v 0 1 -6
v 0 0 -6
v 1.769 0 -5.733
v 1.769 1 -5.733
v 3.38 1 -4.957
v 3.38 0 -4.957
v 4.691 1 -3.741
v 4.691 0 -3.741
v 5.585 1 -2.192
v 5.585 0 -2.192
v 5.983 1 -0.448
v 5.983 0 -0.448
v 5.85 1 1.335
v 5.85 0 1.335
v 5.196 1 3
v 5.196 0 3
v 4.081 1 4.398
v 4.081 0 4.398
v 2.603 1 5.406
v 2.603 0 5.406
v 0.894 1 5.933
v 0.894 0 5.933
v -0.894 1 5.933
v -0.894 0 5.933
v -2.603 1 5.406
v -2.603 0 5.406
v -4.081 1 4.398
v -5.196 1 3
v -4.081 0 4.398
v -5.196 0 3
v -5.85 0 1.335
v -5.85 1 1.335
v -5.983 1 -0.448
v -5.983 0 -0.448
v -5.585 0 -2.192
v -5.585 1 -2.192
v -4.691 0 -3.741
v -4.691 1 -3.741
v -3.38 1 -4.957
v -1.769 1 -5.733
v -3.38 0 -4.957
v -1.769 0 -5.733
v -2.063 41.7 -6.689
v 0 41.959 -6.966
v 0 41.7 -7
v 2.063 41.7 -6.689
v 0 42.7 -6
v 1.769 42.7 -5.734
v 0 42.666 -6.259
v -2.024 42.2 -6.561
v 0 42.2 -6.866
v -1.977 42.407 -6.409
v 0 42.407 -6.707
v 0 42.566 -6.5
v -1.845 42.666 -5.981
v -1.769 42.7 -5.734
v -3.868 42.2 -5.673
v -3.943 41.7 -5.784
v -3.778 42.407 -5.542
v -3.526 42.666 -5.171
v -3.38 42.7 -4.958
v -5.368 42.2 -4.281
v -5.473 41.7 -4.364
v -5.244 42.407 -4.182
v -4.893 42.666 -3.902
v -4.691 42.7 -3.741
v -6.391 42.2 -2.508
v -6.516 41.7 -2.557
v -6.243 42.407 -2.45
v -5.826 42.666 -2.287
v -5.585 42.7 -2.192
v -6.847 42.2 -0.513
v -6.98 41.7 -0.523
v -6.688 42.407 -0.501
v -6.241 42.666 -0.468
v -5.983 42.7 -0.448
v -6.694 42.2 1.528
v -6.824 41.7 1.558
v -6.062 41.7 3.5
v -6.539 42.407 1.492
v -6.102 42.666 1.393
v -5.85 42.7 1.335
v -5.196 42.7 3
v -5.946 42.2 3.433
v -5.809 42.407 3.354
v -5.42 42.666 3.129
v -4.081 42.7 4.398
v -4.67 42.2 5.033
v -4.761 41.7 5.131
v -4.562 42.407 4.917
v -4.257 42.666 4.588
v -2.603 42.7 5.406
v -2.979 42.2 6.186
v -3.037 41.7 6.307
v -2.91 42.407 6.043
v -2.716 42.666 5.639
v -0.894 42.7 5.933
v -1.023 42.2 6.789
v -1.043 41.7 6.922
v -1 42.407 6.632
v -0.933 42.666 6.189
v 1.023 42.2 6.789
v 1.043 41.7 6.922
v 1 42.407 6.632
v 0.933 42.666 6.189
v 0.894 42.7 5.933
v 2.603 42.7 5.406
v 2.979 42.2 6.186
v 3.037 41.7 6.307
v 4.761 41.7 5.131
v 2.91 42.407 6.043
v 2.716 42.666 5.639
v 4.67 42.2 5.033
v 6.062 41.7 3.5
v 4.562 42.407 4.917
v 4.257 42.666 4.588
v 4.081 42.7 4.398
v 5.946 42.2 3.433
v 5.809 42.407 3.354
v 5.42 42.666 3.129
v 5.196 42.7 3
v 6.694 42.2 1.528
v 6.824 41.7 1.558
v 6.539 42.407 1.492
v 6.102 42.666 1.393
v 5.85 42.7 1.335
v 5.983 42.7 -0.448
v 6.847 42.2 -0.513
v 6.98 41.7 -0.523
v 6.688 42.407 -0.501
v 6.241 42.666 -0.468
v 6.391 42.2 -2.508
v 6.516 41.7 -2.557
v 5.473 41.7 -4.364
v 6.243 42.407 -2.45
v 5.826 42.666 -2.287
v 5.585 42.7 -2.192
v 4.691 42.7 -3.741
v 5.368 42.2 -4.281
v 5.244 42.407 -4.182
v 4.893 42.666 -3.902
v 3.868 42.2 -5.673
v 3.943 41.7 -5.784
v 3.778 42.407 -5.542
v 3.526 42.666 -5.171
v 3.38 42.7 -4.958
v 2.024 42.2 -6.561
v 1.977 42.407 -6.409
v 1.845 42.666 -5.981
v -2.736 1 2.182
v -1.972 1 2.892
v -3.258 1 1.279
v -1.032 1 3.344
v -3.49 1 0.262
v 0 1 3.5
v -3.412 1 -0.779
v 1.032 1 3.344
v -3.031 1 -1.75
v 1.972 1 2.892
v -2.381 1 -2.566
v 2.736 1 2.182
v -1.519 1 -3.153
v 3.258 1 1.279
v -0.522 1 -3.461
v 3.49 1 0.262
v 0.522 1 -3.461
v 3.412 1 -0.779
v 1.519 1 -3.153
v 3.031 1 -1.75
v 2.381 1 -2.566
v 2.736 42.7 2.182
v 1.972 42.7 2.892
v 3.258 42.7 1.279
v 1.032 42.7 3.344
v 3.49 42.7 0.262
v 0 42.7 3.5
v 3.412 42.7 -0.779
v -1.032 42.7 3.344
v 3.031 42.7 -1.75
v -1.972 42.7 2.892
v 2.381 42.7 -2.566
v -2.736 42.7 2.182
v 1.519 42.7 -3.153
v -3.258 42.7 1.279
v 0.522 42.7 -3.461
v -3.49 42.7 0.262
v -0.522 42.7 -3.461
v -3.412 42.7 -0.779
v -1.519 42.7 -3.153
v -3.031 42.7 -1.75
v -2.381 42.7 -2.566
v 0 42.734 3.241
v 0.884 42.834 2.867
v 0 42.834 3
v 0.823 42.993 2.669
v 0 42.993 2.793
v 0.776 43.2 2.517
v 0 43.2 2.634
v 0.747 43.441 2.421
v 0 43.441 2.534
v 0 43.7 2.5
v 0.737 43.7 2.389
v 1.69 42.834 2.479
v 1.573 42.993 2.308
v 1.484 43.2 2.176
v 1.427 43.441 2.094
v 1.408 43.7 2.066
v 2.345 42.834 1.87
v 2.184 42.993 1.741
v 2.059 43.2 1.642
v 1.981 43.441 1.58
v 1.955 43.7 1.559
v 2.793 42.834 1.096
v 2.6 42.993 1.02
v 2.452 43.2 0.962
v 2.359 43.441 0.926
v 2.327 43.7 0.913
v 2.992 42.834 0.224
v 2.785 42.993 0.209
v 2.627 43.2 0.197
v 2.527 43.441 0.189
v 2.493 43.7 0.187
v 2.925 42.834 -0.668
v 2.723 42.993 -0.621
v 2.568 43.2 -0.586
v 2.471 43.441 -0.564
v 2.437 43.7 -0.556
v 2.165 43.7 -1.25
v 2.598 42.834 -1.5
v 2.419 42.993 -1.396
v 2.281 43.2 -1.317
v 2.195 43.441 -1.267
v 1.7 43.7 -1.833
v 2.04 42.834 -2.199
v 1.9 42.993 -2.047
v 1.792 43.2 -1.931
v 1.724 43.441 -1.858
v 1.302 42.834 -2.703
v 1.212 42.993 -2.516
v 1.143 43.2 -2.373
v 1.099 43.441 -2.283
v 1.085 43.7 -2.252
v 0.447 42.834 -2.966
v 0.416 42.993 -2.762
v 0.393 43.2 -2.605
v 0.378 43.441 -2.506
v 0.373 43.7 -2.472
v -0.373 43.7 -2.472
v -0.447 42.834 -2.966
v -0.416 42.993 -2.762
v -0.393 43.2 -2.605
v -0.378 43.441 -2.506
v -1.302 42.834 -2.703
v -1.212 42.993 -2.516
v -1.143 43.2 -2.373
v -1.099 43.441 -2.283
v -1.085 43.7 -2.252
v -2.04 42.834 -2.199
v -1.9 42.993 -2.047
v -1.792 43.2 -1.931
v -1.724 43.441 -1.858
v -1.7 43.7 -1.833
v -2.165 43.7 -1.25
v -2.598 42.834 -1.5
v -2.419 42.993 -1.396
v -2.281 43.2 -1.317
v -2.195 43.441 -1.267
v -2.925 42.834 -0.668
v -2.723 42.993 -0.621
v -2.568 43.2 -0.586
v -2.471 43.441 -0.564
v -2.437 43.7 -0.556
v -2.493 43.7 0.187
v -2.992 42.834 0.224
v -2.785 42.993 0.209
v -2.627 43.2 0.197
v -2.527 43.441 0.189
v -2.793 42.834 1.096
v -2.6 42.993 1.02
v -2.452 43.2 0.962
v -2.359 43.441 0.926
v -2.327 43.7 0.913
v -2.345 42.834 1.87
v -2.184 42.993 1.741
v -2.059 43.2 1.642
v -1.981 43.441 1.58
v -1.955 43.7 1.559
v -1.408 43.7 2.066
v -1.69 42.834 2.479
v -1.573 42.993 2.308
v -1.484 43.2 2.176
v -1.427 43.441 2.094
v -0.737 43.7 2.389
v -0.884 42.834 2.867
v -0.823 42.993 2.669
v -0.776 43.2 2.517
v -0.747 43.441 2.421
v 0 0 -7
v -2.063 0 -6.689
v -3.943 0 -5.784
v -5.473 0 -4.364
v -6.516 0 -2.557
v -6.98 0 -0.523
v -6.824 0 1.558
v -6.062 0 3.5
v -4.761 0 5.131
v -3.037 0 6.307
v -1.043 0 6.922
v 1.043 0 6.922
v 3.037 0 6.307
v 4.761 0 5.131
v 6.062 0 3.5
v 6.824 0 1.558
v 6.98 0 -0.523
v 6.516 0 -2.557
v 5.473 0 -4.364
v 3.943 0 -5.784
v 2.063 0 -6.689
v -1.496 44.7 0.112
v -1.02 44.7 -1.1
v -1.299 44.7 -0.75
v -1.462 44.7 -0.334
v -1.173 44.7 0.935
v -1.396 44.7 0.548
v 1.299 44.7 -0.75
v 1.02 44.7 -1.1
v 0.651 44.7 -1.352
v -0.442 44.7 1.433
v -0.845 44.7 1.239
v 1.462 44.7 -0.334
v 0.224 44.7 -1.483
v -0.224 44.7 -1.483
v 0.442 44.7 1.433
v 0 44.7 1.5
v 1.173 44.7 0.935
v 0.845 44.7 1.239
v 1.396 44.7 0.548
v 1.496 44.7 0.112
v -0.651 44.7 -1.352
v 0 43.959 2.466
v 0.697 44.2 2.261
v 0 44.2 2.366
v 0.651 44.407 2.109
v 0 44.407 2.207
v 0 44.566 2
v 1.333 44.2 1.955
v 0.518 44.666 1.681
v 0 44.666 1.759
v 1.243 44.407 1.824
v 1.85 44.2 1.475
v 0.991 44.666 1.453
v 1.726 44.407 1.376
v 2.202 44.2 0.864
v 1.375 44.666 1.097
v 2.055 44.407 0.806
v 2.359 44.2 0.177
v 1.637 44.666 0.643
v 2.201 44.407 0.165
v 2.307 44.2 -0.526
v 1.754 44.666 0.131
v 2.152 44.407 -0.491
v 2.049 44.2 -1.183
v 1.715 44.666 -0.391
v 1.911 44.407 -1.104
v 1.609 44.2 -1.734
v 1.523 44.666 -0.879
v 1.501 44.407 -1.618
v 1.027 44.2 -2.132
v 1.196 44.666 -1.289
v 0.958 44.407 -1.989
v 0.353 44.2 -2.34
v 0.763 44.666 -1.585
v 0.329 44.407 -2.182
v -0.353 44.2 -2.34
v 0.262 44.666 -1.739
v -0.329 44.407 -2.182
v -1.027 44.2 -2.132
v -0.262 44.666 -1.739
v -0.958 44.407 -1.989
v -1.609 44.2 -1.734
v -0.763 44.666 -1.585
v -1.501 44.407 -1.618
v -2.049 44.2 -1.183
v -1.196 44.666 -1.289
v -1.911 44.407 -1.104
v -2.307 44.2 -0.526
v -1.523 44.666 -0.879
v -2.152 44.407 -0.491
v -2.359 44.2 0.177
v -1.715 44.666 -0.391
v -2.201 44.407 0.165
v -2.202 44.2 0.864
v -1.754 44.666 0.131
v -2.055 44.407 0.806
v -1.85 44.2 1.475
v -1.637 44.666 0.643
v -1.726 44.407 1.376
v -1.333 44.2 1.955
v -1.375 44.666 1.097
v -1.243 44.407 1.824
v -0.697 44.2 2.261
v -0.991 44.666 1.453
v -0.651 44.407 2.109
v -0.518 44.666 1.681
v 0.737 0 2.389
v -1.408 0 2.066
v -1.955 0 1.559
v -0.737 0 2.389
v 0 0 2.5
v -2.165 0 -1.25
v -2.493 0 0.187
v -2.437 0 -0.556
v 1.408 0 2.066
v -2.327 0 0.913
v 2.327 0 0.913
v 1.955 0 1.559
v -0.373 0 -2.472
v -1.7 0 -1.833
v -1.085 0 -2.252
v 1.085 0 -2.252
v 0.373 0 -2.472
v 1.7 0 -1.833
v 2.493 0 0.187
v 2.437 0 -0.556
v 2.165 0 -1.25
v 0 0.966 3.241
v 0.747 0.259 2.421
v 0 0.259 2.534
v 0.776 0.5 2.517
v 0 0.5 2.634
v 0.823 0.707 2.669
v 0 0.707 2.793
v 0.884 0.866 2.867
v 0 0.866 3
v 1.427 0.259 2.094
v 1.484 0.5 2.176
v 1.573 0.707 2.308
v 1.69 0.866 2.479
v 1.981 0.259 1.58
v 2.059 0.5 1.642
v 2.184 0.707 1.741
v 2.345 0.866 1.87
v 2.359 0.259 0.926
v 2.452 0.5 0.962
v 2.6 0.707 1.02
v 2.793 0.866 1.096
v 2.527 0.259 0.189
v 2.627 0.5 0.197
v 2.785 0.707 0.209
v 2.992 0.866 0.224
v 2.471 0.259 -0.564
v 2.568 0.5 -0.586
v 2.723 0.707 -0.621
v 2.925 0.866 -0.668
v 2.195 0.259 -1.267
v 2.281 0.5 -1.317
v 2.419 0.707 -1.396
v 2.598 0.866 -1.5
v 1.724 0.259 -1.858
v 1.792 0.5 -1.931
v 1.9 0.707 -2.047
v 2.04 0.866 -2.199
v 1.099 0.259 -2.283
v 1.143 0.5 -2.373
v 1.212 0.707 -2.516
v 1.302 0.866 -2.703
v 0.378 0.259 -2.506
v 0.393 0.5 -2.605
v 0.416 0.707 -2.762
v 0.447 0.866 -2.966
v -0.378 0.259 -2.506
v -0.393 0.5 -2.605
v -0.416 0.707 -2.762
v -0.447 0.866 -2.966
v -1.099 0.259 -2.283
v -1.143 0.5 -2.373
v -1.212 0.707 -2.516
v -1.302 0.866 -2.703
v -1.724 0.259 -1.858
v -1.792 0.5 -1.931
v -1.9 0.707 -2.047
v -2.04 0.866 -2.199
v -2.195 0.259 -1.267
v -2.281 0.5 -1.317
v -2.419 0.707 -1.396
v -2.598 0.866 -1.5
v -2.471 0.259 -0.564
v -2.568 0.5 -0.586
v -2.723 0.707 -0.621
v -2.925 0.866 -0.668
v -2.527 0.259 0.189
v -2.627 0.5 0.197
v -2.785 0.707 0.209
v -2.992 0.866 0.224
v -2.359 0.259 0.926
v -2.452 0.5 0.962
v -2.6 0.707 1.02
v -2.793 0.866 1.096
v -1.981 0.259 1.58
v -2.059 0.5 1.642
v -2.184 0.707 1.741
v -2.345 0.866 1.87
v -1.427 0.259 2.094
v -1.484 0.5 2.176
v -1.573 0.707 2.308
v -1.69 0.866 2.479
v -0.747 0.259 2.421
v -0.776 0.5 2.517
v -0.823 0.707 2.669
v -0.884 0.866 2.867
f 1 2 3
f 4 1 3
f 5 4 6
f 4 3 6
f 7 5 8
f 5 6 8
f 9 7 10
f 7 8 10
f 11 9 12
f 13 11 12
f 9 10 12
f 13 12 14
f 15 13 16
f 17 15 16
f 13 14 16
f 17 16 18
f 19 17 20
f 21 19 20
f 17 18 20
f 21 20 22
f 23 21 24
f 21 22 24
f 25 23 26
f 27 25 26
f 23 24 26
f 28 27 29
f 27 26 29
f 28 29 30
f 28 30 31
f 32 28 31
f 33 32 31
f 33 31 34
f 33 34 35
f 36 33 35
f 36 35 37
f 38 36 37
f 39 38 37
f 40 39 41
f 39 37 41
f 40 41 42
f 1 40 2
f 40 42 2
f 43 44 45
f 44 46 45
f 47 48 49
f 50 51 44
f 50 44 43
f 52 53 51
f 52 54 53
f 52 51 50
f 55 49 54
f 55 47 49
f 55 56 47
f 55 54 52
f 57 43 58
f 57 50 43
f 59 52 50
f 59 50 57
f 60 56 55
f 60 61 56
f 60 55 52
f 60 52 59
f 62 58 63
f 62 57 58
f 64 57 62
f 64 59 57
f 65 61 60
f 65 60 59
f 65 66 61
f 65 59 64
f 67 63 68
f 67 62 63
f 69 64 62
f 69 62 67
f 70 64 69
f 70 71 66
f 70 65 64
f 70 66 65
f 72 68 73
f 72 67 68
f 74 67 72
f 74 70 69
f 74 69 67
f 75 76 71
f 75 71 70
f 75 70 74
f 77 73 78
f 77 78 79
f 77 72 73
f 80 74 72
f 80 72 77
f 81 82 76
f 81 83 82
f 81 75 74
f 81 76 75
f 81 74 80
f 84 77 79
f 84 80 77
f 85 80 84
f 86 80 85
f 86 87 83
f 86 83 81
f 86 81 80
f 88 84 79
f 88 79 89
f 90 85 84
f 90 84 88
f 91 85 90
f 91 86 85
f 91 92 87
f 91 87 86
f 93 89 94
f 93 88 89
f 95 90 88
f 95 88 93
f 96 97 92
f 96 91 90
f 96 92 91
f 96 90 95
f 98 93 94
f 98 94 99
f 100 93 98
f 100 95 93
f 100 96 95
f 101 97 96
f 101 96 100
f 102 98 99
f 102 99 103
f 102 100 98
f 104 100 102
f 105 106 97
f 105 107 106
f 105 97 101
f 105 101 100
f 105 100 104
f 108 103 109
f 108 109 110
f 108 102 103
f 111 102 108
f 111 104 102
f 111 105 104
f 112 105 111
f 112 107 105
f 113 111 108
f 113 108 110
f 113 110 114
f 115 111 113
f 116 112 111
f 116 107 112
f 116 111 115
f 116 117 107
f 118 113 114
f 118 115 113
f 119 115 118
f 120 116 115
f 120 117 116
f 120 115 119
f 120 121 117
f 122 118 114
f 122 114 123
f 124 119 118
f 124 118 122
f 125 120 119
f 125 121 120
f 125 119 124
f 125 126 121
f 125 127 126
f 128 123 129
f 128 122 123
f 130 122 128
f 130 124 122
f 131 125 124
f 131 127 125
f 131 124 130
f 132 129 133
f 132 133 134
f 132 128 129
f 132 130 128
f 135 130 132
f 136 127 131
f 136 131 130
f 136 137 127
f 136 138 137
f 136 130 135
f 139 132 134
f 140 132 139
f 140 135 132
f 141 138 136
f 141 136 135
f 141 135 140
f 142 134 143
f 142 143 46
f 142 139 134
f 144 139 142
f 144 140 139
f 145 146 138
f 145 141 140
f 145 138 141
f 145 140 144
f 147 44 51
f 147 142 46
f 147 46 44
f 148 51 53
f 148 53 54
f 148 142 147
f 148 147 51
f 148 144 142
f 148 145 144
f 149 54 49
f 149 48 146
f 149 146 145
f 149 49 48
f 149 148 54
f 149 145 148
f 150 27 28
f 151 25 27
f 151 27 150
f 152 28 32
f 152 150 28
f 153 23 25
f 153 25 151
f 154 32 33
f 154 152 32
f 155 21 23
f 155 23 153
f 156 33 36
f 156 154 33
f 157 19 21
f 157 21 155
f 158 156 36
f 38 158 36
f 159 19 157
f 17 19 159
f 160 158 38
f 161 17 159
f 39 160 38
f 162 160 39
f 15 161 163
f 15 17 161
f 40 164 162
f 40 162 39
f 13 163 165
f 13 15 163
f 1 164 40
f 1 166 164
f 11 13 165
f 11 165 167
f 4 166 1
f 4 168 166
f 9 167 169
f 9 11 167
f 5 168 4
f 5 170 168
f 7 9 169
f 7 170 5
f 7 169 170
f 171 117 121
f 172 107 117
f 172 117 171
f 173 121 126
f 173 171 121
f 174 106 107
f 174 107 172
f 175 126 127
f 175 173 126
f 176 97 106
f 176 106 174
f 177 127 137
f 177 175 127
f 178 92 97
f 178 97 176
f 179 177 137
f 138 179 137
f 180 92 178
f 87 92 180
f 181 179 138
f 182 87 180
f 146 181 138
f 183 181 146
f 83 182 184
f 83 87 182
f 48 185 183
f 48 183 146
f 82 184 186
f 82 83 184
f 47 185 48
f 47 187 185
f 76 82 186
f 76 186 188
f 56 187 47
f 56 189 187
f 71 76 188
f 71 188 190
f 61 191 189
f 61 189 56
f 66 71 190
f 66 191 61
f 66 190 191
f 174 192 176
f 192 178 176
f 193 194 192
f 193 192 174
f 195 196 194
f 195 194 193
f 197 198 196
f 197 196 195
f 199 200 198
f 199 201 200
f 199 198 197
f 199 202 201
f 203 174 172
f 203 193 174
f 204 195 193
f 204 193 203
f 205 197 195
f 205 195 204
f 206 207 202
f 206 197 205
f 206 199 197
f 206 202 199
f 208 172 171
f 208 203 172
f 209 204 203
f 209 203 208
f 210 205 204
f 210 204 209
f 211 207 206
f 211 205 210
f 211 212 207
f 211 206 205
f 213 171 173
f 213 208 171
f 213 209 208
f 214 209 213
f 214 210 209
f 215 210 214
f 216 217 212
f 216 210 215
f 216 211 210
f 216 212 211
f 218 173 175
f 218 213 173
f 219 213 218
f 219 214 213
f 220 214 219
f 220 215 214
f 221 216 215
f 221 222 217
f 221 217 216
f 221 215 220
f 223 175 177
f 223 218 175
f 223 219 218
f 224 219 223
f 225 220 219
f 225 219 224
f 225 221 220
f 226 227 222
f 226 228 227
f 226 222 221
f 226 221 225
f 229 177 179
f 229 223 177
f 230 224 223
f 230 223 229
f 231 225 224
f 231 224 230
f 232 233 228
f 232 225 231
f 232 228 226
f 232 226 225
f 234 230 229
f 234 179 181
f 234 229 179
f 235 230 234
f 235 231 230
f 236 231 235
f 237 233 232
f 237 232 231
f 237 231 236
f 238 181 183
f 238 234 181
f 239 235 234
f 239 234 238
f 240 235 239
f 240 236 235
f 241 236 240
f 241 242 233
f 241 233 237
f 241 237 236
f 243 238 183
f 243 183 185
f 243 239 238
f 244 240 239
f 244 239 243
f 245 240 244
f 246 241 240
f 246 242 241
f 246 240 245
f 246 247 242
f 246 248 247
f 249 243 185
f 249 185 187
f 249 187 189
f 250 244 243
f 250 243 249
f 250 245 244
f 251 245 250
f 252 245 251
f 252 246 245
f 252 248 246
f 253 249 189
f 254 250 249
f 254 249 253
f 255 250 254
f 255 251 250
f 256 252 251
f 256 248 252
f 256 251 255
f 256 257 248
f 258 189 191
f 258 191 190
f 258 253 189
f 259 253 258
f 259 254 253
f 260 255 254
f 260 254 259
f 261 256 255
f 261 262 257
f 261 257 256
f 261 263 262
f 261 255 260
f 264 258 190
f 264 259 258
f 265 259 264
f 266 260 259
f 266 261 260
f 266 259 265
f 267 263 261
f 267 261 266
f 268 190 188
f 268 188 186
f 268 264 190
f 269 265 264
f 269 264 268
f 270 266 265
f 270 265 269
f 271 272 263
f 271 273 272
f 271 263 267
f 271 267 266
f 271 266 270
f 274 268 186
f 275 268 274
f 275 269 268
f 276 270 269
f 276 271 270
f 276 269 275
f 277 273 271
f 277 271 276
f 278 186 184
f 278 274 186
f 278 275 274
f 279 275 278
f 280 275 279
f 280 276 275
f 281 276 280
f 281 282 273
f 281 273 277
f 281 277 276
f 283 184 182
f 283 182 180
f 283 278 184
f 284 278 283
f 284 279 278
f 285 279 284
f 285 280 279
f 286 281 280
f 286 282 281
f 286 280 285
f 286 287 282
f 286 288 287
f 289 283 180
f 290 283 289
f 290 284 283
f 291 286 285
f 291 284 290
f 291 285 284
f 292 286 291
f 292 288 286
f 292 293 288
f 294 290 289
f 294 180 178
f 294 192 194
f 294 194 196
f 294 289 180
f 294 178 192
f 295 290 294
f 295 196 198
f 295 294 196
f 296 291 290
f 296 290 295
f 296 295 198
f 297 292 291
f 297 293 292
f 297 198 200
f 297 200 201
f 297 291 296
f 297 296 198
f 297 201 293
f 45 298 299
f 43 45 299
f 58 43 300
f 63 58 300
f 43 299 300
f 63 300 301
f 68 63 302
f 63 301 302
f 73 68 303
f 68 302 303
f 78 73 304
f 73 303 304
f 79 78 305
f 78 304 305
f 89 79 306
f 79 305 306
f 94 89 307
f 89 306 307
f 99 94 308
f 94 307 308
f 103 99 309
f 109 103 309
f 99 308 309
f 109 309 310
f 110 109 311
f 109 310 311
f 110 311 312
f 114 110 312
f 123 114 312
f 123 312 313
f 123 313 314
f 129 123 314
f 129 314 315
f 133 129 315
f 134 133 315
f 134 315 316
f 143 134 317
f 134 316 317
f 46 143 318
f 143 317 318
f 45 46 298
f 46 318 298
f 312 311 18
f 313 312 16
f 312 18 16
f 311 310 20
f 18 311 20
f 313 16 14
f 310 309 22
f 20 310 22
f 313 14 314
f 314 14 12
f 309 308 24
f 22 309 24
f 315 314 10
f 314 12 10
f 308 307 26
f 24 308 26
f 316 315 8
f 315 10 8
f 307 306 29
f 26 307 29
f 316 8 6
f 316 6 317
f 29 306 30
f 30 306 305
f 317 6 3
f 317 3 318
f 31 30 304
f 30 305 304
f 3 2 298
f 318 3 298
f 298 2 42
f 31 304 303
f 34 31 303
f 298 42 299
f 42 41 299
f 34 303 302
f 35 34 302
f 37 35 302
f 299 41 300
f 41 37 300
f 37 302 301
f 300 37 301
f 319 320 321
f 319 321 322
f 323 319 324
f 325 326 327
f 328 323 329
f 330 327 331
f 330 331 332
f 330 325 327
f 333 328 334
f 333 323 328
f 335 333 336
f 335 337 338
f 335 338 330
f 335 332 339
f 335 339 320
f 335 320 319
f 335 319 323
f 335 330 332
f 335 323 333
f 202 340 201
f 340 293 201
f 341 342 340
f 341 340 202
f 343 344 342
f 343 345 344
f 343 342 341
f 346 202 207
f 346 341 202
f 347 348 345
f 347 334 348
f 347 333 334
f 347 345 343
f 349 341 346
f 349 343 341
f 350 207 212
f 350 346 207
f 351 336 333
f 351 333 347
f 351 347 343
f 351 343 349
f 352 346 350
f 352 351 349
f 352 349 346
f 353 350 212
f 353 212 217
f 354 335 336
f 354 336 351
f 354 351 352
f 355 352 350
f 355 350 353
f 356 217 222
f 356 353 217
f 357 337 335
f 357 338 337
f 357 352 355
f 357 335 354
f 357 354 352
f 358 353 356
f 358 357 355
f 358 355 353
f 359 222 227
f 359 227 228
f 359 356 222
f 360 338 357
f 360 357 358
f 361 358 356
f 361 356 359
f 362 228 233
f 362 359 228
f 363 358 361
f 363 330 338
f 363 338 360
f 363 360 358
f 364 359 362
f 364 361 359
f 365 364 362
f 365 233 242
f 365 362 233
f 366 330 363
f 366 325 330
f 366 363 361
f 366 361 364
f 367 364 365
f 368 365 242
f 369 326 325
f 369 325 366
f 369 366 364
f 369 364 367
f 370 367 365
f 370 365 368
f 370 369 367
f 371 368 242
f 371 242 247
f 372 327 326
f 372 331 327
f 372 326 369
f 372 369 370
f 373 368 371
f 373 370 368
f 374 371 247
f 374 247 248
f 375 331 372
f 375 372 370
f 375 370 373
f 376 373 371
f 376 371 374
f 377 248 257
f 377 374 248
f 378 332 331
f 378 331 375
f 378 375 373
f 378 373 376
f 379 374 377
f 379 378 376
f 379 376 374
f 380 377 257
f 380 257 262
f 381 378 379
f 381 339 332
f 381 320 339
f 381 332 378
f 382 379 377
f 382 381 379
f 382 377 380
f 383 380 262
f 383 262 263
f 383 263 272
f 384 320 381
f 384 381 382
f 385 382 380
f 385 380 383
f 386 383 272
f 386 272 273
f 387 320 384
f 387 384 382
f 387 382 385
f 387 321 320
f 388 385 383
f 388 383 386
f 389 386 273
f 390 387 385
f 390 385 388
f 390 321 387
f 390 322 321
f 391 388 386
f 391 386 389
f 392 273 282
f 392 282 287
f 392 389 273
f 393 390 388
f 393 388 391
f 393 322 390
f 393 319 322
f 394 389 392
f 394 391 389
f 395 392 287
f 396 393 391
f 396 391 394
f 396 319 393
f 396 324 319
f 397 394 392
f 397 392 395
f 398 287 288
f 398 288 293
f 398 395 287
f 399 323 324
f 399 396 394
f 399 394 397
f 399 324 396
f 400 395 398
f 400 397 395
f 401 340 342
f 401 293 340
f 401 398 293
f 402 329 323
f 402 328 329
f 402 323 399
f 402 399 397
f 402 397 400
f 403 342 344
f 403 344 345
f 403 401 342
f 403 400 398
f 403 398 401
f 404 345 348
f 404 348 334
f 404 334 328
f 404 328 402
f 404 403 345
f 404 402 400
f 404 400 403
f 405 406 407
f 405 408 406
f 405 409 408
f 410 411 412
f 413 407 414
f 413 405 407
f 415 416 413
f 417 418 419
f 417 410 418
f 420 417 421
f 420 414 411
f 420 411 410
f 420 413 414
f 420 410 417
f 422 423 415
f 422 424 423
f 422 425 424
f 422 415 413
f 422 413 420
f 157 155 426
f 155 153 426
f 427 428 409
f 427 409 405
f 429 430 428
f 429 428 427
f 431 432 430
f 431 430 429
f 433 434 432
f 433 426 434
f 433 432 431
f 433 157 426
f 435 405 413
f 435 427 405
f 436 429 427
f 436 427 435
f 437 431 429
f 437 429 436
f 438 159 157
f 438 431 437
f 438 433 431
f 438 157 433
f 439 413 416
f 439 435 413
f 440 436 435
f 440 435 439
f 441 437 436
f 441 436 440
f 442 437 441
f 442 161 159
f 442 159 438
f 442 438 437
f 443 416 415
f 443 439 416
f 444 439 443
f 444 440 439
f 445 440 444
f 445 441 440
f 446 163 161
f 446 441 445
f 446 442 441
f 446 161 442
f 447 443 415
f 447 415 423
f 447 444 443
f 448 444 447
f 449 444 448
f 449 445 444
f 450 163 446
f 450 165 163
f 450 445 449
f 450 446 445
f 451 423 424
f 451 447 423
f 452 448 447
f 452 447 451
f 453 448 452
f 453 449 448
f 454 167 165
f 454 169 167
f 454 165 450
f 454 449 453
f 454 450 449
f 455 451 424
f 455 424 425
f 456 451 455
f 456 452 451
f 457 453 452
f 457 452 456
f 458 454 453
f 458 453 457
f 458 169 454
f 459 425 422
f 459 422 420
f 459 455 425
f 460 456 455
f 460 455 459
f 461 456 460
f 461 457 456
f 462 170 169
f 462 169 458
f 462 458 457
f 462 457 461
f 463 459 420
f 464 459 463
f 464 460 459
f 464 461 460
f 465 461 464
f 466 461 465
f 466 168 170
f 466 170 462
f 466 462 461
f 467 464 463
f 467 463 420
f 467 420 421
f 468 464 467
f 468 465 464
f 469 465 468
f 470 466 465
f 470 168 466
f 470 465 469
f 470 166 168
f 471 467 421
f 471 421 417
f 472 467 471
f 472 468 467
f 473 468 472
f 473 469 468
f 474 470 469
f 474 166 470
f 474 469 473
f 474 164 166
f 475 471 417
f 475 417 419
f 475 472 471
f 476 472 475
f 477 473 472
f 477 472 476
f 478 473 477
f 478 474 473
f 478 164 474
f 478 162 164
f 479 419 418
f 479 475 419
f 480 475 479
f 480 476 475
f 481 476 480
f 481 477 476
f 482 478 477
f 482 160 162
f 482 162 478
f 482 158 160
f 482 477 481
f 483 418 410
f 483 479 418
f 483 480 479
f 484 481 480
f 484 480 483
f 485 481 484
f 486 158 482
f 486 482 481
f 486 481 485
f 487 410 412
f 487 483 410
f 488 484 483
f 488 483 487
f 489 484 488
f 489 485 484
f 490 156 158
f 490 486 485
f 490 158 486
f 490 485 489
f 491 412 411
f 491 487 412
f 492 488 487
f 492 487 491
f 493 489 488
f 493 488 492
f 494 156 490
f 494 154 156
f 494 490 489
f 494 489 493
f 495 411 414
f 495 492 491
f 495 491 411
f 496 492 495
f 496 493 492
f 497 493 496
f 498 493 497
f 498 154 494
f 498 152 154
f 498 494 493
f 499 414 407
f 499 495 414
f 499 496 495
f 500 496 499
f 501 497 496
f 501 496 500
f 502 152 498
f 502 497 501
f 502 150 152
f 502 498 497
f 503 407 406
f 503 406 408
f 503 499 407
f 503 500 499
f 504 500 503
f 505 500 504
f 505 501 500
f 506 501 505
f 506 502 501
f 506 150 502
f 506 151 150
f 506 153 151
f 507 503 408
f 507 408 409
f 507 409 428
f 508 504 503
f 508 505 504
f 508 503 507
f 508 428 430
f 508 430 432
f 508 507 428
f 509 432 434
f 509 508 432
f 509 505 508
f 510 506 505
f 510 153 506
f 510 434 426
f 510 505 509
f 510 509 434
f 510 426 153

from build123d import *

# Parameters (mm, degrees)
SKETCH1_R                       = 7
BOSS_EXTRUDE1_DEPTH             = 42.7
SKETCH3_R                       = 6
CUT_EXTRUDE1_DEPTH              = 1
SKETCH2_R                       = 2.5
BOSS_EXTRUDE2_DEPTH             = 2
BOSS_EXTRUDE2_DIRECTION_2_REACH = 45.833
FILLET2_R                       = 1
FILLET4_R                       = 1


with BuildPart() as part:
    # Sketch1 → Boss-Extrude1 (new body)
    with BuildSketch(Plane(origin=(0, 0, 0), x_dir=(1, 0, 0), z_dir=(0, 1, 0))):
        with Locations(Location((0, 0, 0), (0, 0, 90))):
            Circle(SKETCH1_R)
    extrude(amount=BOSS_EXTRUDE1_DEPTH)

    # Sketch3 → Cut-Extrude1 (cut)
    with BuildSketch(Plane.XZ):
        with Locations(Location((0, 0, 0), (0, 0, 270))):
            Circle(SKETCH3_R)
    extrude(amount=-CUT_EXTRUDE1_DEPTH, mode=Mode.SUBTRACT)

    # Sketch2 → Boss-Extrude2 (add)
    with BuildSketch(Plane(origin=(0, 42.7, 0), x_dir=(1, 0, 0), z_dir=(0, 1, 0))):
        with Locations(Location((0, 0, 0), (0, 0, 270))):
            Circle(SKETCH2_R)
    extrude(amount=BOSS_EXTRUDE2_DEPTH)

    # Boss-Extrude2 direction 2: up to this face of the body (flat: up to its plane)
    boss_extrude2_direction_2_end = Plane(part.part.faces().sort_by_distance((0, 0, 6.802010101))[0])
    # Sketch2 → Boss-Extrude2 direction 2 (add, up to the picked face)
    with BuildSketch(Plane(origin=(0, 42.7, 0), x_dir=(1, 0, 0), z_dir=(0, 1, 0)), mode=Mode.PRIVATE) as boss_extrude2_direction_2_sk1:
        with Locations(Location((0, 0, 0), (0, 0, 270))):
            Circle(SKETCH2_R)
    boss_extrude2_direction_2_tool1 = split(extrude(boss_extrude2_direction_2_sk1.sketch, amount=-BOSS_EXTRUDE2_DIRECTION_2_REACH, mode=Mode.PRIVATE), bisect_by=boss_extrude2_direction_2_end, keep=Keep.BOTH, mode=Mode.PRIVATE)
    add(boss_extrude2_direction_2_tool1.solids().sort_by(Axis((0, 42.7, 0), (0, -1, 0)))[0])

    # Fillet2
    fillet2_edges = [part.edges().sort_by_distance(p)[0] for p in [
        (0, 1, -2.5),
    ]]
    fillet(fillet2_edges, radius=FILLET2_R - 0.0001)  # a hair under: the kernel refuses the full size

    # Fillet4
    fillet4_edges = [part.edges().sort_by_distance(p)[0] for p in [
        (0, 42.7, -2.5),
        (0, 44.7, -2.5),
        (0, 42.7, 7),
    ]]
    fillet(fillet4_edges, radius=FILLET4_R - 0.0001)  # a hair under: the kernel refuses the full size


solid = part.part
